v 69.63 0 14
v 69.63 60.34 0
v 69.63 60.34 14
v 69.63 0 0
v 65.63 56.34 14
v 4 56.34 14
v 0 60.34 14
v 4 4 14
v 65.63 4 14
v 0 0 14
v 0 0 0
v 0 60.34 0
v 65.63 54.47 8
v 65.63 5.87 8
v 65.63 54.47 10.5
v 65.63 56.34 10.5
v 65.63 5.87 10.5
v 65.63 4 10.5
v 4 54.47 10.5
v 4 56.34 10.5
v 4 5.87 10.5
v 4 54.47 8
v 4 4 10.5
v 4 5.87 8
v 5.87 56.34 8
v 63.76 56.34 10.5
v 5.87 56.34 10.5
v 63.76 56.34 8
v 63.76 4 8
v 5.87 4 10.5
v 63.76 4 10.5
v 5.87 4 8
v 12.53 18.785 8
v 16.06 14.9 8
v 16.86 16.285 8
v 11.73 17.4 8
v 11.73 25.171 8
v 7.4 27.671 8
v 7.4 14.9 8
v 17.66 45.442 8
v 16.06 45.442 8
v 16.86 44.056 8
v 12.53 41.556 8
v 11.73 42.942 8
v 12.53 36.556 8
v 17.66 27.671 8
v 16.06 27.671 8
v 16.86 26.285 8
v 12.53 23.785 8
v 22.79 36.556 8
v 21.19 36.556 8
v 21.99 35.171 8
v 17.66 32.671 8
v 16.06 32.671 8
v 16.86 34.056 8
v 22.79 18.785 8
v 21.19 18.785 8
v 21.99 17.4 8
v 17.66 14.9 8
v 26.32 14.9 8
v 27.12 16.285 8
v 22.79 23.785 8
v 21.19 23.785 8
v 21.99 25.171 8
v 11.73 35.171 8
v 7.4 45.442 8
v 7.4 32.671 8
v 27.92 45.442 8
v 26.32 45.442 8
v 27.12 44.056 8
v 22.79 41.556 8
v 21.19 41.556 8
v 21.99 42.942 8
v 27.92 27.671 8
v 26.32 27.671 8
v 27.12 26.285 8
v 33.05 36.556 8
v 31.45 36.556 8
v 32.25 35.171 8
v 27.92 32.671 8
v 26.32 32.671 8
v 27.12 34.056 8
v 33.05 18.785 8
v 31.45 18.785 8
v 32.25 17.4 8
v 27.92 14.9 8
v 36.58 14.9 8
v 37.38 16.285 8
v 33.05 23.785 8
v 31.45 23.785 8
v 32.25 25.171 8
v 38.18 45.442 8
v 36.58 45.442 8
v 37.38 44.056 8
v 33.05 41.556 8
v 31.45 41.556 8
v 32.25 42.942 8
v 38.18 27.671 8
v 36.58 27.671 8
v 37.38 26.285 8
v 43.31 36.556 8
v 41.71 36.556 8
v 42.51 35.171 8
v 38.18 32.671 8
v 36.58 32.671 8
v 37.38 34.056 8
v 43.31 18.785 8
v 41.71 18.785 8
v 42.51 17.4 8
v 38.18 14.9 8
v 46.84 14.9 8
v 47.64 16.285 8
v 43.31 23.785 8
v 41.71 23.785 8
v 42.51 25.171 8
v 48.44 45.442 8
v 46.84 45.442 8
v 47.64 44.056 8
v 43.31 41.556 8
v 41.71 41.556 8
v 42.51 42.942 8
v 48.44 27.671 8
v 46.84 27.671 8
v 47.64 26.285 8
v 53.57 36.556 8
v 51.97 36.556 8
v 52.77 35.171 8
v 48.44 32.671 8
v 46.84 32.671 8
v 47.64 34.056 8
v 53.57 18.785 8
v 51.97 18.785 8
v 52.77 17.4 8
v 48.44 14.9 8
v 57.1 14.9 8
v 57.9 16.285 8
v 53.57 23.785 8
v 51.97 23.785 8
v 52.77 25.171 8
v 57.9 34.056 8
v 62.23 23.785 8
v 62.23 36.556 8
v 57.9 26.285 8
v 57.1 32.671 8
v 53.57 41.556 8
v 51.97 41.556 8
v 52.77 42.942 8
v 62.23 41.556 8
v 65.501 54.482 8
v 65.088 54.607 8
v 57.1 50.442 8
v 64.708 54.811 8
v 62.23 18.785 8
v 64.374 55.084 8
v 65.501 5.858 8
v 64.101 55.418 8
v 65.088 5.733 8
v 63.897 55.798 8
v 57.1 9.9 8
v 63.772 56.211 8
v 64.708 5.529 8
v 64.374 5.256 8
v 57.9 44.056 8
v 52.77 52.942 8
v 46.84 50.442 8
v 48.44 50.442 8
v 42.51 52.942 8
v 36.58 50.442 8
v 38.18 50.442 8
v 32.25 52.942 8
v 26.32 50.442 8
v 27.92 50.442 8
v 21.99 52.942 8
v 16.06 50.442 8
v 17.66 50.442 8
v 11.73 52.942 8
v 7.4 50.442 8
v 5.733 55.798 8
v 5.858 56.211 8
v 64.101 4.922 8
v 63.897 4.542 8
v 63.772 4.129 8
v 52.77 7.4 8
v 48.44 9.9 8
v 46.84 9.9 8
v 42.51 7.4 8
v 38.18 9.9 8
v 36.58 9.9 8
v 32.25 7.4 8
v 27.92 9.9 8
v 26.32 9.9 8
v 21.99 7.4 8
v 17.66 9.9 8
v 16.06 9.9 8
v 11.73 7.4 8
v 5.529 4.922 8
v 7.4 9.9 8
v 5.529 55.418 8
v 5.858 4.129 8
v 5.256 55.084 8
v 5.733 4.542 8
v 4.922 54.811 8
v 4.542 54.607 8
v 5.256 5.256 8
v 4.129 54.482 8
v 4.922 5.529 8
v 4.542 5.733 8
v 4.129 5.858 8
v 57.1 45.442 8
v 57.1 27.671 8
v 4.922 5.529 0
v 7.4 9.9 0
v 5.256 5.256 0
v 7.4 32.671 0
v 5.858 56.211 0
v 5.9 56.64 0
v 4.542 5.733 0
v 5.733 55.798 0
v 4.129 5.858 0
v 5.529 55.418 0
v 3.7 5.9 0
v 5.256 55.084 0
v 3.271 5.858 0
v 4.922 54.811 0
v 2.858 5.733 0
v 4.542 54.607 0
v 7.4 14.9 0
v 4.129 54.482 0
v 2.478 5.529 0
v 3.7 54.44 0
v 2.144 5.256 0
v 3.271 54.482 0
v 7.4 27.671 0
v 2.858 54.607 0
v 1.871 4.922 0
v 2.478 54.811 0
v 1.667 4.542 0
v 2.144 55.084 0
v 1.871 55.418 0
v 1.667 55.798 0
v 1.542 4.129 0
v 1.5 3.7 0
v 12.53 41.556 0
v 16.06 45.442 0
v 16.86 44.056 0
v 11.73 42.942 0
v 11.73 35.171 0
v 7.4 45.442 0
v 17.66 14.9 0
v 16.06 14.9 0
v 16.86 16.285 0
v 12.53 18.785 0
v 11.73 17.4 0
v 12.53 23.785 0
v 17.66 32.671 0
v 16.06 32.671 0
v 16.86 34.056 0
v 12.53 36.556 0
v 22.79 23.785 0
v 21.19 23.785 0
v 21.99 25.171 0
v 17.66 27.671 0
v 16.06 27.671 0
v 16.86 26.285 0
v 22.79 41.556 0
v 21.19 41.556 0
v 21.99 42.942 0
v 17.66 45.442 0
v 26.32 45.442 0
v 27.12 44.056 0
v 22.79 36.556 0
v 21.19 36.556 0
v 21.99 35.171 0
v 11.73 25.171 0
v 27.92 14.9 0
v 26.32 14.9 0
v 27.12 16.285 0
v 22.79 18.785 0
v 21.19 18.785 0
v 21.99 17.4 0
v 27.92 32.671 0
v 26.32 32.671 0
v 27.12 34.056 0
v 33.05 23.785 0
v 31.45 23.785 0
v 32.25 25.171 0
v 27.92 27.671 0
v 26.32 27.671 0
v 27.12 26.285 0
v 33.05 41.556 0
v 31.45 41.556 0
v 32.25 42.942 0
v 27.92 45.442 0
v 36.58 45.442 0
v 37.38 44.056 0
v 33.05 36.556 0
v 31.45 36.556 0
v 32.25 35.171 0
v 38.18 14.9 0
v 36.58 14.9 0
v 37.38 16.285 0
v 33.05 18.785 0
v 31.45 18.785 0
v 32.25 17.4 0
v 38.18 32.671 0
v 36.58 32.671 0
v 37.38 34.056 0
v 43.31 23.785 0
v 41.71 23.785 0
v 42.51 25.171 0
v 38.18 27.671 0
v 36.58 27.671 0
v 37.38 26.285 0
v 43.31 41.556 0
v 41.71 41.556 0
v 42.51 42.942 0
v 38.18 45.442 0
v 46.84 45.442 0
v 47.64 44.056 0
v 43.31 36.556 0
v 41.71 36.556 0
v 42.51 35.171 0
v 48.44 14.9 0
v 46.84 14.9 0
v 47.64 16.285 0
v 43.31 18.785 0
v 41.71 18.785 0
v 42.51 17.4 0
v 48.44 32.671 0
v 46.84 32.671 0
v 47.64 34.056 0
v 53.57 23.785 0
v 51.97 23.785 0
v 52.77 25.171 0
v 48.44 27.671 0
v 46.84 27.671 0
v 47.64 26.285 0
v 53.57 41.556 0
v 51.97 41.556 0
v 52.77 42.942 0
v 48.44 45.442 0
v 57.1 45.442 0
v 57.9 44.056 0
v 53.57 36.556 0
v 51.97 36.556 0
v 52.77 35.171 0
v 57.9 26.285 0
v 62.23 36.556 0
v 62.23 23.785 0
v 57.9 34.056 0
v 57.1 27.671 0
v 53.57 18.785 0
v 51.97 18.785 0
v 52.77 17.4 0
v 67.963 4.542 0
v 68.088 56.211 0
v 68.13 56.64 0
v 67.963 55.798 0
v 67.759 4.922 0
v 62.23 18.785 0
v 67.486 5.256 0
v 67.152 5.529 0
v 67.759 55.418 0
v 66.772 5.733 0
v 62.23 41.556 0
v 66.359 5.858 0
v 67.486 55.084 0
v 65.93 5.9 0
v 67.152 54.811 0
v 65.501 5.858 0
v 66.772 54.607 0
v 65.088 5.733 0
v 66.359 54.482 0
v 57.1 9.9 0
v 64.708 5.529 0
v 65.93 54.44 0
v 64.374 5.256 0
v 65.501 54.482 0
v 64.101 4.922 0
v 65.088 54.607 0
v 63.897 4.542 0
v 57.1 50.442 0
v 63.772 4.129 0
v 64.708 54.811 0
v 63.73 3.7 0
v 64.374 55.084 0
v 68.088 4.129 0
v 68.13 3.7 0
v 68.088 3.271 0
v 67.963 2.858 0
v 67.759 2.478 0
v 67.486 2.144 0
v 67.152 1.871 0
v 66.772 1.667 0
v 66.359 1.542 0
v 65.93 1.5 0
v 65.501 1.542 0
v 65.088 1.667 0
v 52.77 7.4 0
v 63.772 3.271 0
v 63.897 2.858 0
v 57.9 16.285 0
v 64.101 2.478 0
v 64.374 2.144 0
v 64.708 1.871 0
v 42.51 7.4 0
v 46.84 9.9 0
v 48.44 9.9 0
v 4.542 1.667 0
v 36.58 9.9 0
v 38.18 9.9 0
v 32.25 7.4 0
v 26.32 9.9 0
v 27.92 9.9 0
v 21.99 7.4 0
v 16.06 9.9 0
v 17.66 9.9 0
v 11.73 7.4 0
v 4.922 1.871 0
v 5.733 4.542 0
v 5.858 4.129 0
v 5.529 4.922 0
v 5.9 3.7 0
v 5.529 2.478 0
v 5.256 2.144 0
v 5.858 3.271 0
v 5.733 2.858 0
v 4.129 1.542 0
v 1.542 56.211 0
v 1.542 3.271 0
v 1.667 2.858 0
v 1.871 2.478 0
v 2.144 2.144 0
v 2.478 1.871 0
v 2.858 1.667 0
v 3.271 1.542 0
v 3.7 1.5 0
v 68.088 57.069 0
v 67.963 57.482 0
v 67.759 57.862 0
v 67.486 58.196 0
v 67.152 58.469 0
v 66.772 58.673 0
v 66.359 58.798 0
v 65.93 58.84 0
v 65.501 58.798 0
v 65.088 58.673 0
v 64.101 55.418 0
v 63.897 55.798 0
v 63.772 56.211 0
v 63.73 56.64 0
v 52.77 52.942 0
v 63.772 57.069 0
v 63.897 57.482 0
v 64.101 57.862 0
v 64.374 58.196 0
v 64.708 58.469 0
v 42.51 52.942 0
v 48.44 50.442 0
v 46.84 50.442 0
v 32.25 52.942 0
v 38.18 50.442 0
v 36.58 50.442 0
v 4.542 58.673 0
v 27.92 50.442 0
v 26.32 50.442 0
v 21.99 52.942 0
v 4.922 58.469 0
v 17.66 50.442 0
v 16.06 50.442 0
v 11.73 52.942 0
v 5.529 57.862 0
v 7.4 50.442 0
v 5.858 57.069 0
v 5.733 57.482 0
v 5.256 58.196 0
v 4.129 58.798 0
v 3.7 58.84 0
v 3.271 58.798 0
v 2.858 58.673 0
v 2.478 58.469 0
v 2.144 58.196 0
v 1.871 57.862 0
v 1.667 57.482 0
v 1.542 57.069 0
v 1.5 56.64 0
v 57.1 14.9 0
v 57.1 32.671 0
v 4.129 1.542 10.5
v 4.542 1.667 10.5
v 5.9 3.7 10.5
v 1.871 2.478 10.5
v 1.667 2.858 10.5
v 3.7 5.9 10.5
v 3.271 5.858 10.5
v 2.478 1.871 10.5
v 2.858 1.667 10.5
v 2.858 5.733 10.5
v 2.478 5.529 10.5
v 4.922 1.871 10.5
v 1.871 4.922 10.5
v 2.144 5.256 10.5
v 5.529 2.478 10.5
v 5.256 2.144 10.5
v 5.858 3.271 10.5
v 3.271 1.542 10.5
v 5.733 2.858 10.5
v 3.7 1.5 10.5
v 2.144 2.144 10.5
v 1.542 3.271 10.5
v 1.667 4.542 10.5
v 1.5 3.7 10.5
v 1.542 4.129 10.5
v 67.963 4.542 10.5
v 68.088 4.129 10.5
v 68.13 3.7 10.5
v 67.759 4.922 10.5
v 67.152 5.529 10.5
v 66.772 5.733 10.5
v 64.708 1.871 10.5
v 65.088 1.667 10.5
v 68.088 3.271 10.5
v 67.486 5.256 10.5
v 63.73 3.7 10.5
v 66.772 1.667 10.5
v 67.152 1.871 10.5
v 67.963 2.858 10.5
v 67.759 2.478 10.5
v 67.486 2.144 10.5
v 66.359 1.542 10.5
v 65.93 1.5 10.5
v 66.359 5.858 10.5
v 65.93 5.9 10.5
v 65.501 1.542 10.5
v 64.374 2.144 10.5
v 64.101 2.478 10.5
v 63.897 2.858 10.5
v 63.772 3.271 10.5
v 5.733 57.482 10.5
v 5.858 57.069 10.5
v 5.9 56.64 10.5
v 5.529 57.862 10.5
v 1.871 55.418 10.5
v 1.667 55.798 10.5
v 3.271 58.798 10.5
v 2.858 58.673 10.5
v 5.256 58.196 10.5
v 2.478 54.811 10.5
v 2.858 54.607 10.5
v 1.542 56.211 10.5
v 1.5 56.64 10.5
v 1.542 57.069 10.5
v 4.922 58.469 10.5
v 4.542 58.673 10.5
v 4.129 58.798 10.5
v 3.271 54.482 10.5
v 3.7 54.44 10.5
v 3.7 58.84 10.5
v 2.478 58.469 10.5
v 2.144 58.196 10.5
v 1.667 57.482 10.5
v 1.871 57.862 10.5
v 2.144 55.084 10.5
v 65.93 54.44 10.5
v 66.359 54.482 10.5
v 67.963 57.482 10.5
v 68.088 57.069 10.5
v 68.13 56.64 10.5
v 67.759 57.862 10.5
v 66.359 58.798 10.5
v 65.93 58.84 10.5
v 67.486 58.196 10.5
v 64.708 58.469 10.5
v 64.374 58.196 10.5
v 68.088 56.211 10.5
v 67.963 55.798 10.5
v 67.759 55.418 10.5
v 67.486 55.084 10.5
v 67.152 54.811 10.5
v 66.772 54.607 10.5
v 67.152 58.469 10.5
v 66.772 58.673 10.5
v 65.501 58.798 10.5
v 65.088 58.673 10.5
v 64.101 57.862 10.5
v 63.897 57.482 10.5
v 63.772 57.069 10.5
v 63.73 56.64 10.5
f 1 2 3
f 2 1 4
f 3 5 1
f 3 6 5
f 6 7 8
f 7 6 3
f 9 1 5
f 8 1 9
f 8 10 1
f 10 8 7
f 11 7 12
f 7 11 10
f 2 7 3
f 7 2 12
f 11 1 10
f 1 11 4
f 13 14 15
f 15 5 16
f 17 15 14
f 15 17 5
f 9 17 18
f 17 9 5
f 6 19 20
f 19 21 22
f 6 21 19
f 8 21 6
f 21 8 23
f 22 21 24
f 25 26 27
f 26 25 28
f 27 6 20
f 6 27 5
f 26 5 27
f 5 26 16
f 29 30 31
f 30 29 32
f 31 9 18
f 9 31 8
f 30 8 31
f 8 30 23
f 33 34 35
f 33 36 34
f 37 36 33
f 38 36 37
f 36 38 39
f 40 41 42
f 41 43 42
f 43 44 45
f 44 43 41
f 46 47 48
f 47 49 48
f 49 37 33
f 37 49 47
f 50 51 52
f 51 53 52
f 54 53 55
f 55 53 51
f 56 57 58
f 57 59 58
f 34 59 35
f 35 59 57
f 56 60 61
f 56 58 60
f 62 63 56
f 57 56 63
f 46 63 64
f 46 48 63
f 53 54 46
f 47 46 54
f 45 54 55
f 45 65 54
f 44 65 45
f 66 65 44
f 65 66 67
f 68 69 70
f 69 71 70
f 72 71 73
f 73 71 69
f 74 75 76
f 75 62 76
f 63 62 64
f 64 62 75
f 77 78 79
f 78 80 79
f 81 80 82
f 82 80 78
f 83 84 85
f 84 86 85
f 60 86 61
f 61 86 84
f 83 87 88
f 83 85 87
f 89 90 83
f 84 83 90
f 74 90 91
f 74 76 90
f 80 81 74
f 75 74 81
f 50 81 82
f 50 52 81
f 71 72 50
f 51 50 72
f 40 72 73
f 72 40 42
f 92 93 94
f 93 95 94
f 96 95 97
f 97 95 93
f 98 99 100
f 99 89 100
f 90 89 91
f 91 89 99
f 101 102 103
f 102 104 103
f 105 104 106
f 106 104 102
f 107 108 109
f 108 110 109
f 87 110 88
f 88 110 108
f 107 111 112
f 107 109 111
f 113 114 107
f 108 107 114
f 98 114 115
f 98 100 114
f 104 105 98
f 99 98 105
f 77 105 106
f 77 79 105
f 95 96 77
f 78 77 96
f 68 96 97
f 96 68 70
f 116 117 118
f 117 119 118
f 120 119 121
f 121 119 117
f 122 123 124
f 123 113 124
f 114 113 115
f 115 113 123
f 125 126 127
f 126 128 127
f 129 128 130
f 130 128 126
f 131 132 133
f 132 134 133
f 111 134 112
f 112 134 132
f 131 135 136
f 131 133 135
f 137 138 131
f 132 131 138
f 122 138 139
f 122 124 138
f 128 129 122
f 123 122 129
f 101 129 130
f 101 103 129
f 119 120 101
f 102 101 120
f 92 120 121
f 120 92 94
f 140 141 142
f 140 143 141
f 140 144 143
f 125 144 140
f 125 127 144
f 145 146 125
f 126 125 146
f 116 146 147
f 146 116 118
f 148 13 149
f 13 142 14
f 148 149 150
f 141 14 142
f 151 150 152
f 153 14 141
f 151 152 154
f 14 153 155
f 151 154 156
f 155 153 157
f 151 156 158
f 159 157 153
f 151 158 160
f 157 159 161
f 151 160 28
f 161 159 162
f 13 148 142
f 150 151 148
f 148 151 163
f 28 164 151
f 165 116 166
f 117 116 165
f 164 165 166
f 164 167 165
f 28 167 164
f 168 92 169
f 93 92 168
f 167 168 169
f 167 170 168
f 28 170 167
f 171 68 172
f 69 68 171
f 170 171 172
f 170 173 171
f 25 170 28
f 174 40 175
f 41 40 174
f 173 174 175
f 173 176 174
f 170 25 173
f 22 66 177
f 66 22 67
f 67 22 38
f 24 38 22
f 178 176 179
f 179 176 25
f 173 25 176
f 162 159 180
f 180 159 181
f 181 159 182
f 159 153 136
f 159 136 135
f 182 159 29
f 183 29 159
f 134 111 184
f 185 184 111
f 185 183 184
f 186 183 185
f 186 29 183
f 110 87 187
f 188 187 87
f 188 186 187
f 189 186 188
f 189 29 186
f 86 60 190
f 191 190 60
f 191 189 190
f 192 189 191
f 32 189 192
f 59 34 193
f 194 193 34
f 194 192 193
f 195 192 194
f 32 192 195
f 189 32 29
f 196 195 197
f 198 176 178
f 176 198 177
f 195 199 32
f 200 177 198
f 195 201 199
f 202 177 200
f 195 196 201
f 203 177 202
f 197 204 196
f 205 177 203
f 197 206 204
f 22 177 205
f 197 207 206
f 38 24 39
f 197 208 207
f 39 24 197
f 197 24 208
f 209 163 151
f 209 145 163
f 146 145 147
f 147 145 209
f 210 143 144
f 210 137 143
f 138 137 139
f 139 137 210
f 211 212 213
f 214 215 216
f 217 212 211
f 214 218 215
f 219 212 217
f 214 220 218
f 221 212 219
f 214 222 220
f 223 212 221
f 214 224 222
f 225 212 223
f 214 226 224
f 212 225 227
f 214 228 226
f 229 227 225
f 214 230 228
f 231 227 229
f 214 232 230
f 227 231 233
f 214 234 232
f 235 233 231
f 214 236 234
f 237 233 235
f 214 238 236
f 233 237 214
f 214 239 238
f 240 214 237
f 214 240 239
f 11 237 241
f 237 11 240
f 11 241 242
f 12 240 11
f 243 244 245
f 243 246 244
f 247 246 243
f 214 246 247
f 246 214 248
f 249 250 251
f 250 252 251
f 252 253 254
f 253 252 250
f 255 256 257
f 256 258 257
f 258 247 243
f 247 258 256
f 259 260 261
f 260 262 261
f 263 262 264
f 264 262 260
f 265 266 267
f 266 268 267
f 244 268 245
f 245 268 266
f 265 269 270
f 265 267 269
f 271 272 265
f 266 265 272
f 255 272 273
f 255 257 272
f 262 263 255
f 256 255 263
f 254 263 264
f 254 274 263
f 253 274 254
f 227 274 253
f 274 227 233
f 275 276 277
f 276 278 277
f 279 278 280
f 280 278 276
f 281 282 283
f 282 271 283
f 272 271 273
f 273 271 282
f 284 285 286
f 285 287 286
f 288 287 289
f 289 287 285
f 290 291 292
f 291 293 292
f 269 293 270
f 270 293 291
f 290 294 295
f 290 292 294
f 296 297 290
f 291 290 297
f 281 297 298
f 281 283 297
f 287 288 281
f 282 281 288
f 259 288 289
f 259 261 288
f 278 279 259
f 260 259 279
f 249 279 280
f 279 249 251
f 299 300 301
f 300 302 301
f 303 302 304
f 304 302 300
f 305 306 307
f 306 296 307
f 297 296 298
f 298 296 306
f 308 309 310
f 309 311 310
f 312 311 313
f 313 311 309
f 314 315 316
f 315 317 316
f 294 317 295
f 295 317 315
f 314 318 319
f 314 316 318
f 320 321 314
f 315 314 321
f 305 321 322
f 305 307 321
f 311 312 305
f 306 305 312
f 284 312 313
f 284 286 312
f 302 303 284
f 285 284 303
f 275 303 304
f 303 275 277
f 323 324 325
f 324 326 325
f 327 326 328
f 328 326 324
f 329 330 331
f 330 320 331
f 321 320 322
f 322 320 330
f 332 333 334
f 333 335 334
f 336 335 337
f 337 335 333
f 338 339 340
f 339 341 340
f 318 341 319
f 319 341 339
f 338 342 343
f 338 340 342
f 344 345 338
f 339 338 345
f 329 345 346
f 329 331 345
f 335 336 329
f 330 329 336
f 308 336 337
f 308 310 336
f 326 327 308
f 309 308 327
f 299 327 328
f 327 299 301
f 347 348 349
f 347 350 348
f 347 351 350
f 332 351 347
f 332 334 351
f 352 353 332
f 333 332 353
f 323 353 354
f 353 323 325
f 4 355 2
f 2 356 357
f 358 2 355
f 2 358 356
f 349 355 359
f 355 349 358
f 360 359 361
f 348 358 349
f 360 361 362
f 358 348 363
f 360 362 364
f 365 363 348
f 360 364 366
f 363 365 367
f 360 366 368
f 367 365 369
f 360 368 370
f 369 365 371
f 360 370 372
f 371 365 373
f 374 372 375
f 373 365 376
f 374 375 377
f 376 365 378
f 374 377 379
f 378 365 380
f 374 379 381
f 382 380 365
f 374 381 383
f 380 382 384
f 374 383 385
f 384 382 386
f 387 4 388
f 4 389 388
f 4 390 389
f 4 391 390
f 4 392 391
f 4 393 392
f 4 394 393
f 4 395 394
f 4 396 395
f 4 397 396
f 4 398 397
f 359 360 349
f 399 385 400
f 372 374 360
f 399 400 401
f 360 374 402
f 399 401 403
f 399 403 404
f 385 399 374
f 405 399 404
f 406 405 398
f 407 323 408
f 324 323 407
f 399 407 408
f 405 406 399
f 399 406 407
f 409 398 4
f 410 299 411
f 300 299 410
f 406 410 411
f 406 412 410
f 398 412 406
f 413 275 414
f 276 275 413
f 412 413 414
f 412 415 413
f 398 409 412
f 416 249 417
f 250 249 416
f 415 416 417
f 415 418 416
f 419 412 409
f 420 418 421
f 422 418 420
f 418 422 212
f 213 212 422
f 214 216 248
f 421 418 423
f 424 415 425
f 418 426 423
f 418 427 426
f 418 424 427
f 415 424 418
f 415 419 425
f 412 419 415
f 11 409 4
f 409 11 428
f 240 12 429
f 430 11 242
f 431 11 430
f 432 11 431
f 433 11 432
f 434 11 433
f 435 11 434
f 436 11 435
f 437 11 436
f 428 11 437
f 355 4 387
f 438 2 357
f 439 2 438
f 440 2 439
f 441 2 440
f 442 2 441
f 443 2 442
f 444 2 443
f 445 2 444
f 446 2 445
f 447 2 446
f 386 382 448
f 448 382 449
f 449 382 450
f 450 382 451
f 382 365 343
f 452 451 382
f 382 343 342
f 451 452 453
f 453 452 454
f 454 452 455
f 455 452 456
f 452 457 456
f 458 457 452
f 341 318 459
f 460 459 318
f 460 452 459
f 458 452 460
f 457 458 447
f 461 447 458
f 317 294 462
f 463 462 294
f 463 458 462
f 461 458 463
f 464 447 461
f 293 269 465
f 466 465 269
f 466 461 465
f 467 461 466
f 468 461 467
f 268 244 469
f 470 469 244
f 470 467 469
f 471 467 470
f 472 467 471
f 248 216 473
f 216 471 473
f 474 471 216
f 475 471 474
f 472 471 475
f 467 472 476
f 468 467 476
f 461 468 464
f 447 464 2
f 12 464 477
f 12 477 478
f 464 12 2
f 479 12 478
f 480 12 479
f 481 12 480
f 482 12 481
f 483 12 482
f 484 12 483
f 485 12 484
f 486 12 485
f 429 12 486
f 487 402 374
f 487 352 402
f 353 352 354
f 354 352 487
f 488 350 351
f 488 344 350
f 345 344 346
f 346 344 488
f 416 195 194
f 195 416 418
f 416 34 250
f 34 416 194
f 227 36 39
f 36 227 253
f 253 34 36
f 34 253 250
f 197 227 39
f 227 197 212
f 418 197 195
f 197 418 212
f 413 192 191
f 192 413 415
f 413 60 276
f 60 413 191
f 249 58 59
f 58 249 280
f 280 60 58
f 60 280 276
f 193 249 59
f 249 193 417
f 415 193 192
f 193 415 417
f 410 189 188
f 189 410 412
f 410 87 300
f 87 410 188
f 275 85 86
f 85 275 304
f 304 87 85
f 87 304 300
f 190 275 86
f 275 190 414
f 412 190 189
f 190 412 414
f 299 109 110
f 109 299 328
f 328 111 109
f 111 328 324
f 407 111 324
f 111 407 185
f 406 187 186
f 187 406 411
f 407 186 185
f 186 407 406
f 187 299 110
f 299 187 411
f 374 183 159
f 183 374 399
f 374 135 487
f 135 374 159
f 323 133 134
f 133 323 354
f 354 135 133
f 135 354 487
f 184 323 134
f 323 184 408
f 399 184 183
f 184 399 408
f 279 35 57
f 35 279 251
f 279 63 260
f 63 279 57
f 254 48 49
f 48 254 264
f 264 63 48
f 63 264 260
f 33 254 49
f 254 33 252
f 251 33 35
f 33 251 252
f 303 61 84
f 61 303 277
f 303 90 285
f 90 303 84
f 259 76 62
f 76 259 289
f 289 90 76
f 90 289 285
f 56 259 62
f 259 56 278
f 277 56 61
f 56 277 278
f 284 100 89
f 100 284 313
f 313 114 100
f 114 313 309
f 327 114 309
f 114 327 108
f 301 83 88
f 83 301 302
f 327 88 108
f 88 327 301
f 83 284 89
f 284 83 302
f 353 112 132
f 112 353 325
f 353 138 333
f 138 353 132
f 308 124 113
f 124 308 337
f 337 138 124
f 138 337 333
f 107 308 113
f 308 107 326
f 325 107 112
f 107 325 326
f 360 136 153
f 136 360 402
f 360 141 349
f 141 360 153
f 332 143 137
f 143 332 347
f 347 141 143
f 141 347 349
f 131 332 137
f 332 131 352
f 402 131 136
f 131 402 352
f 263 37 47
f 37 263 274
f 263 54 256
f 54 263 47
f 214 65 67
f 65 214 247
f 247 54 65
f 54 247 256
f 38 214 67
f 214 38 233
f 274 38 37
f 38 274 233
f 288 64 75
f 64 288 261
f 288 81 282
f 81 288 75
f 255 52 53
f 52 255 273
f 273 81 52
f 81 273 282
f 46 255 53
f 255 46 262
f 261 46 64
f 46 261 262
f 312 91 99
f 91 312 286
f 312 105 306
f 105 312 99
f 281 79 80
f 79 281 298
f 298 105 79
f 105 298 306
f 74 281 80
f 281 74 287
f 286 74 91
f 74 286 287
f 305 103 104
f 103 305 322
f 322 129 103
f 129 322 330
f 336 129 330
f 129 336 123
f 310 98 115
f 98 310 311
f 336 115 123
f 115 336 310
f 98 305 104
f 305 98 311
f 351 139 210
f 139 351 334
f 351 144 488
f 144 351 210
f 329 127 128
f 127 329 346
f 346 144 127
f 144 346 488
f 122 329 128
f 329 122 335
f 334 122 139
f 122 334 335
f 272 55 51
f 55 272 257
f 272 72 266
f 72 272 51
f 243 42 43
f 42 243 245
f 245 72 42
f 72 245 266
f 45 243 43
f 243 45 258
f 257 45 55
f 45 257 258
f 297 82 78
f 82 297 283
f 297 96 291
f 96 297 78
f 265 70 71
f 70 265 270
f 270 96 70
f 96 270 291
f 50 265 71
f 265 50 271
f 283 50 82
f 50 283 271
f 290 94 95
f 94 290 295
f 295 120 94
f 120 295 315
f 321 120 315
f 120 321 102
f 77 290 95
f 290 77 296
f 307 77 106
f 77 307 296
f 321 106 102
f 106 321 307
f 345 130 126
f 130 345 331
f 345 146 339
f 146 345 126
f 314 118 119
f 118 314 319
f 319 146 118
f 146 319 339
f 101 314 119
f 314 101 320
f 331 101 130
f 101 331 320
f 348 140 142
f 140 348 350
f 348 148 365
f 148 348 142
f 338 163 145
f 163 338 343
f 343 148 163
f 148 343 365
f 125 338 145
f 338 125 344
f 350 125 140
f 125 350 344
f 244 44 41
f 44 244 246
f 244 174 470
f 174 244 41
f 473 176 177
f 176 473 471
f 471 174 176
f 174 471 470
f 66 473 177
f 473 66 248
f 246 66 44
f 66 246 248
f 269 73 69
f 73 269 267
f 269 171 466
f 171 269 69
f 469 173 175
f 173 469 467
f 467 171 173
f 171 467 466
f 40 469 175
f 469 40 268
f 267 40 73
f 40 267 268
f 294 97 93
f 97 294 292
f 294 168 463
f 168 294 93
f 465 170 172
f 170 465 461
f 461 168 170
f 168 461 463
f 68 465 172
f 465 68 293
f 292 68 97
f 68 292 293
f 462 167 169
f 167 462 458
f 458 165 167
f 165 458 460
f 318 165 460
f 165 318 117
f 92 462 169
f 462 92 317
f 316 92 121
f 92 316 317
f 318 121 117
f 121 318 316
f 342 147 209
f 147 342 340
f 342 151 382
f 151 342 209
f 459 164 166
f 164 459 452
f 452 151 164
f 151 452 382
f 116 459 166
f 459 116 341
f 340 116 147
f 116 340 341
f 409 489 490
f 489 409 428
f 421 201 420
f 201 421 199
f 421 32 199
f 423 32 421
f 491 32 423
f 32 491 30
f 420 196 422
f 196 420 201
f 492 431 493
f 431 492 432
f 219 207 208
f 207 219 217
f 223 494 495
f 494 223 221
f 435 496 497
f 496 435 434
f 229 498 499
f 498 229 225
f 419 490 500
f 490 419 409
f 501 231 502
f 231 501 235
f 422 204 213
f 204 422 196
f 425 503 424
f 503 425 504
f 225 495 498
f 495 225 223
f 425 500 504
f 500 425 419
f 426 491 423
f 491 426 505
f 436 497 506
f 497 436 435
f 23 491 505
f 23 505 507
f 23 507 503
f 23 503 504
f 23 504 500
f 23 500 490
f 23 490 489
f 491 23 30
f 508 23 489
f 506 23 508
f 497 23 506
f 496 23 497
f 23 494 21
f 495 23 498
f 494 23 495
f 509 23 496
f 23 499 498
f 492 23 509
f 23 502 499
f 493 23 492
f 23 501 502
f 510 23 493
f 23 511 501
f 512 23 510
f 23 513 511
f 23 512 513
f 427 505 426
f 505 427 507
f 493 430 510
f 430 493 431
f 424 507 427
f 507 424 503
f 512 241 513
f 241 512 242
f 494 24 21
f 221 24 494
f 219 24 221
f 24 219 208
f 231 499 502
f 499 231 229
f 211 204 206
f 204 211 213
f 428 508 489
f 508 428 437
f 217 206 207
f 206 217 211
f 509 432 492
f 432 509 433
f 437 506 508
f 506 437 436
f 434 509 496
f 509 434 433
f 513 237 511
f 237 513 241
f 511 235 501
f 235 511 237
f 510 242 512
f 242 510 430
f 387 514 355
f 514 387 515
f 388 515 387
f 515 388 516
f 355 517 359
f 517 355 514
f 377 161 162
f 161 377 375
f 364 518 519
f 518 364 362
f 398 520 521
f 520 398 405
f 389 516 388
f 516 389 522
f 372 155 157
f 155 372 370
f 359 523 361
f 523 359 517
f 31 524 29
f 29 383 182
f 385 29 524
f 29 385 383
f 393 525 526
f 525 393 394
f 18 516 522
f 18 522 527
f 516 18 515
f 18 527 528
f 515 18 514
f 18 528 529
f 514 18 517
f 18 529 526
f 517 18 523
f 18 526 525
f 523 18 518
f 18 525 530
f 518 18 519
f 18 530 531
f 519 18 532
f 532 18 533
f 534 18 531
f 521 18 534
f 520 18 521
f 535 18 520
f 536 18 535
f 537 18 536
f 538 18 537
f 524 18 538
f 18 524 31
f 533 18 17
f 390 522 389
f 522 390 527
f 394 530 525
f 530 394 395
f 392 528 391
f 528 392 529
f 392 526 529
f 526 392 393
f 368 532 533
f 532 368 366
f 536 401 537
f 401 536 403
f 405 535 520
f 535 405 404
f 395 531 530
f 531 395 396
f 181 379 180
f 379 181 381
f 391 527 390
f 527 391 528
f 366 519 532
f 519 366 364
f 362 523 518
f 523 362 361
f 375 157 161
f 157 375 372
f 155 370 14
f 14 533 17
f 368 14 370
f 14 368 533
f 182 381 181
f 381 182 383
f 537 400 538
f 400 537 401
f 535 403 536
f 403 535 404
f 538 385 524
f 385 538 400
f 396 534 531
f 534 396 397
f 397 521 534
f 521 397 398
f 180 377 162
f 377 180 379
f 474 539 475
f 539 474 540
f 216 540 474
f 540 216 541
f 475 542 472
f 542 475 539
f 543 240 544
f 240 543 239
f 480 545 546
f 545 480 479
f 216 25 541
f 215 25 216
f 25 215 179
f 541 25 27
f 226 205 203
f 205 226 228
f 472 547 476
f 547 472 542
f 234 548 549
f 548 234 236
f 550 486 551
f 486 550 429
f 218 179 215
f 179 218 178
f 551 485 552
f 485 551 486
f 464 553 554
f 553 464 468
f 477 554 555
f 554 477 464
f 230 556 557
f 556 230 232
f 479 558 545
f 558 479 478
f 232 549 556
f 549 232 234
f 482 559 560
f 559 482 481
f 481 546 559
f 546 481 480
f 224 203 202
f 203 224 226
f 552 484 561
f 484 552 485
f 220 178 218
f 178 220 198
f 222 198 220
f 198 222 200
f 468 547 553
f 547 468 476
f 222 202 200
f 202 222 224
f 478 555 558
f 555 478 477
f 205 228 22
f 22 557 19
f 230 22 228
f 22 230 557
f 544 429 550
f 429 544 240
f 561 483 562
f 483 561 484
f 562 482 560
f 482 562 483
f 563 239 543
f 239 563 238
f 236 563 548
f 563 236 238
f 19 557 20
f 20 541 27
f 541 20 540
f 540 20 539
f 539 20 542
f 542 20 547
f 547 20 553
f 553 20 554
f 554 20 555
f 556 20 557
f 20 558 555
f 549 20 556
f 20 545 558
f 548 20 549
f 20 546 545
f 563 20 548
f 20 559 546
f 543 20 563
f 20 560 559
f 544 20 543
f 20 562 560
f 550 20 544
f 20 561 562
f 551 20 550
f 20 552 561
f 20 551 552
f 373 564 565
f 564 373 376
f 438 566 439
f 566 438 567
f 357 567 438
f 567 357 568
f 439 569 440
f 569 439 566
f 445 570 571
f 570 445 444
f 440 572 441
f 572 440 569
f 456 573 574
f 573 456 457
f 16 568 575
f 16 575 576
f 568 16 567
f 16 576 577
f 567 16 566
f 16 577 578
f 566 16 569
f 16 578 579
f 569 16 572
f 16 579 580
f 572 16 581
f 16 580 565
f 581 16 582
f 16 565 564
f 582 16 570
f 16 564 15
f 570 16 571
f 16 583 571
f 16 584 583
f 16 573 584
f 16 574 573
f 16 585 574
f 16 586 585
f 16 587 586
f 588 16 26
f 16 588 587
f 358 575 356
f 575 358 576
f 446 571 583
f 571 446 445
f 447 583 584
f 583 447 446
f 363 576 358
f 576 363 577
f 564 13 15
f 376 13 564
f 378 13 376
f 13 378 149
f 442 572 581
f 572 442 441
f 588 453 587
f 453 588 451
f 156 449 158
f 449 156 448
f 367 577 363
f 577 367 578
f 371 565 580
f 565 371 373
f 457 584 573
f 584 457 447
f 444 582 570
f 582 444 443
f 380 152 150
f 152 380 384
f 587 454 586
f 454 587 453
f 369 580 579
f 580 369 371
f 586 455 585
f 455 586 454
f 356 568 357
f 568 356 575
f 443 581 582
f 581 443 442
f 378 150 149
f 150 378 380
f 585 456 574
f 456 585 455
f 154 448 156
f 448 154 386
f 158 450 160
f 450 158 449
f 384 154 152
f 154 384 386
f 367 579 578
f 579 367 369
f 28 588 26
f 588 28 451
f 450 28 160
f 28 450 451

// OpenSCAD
$fn = 32;

// ----------------------------------------------------------------------
// Honeycomb panel: 69.63 x 60.34 mm, 25 cells of 10 mm
// ----------------------------------------------------------------------

// --- parameters (mm) ---
panel_w = 69.63;          // panel width
panel_d = 60.34;          // panel depth
thick = 8;                // panel thickness
cell_r = 5;               // hex cell circumradius
pitch = 10.26;            // hex cell pitch (centre to centre)
web = 1.6;                // web between the cells
columns = 5;              // columns of cells
rows = 5;                 // rows of cells
cell_count = 25;          // total cells
shift_x = 11.73;          // first cell offset in x
shift_y = 12.4;           // first cell offset in y
mount_d = 4.4;            // corner mounting holes
hole_off = 3.7;           // mounting hole offset from the corners
rim_h = 14;               // rim height
rim_t = 4;                // rim wall thickness

difference() {
  union() {
    cube([panel_w, panel_d, thick]);
    /* rim around the panel, sunk 1 mm into the plate */
    translate([0, 0, thick - 1]) difference() {
      cube([panel_w, panel_d, rim_h - thick + 1]);
      translate([rim_t, rim_t, -2.5]) cube([panel_w - 2 * rim_t, panel_d - 2 * rim_t, rim_h - thick + 6]);
    }
  }
  /* hexagonal cells, point-up, cut right through the plate */
  for (row = [0 : rows - 1]) {
    for (col = [0 : columns - 1]) {
      translate([shift_x + col * pitch + (row % 2) * pitch / 2, shift_y + row * pitch * 0.866025, -2.5]) rotate([0, 0, 30]) cylinder(h = thick + 5, d = 2 * cell_r, $fn = 6);
    }
  }
  /* corner mounting holes, clear of the outer cell web */
  translate([3.7, 3.7, -2.5]) cylinder(h = thick + 5, d = mount_d);
  translate([65.93, 3.7, -2.5]) cylinder(h = thick + 5, d = mount_d);
  translate([3.7, 56.64, -2.5]) cylinder(h = thick + 5, d = mount_d);
  translate([65.93, 56.64, -2.5]) cylinder(h = thick + 5, d = mount_d);
}
